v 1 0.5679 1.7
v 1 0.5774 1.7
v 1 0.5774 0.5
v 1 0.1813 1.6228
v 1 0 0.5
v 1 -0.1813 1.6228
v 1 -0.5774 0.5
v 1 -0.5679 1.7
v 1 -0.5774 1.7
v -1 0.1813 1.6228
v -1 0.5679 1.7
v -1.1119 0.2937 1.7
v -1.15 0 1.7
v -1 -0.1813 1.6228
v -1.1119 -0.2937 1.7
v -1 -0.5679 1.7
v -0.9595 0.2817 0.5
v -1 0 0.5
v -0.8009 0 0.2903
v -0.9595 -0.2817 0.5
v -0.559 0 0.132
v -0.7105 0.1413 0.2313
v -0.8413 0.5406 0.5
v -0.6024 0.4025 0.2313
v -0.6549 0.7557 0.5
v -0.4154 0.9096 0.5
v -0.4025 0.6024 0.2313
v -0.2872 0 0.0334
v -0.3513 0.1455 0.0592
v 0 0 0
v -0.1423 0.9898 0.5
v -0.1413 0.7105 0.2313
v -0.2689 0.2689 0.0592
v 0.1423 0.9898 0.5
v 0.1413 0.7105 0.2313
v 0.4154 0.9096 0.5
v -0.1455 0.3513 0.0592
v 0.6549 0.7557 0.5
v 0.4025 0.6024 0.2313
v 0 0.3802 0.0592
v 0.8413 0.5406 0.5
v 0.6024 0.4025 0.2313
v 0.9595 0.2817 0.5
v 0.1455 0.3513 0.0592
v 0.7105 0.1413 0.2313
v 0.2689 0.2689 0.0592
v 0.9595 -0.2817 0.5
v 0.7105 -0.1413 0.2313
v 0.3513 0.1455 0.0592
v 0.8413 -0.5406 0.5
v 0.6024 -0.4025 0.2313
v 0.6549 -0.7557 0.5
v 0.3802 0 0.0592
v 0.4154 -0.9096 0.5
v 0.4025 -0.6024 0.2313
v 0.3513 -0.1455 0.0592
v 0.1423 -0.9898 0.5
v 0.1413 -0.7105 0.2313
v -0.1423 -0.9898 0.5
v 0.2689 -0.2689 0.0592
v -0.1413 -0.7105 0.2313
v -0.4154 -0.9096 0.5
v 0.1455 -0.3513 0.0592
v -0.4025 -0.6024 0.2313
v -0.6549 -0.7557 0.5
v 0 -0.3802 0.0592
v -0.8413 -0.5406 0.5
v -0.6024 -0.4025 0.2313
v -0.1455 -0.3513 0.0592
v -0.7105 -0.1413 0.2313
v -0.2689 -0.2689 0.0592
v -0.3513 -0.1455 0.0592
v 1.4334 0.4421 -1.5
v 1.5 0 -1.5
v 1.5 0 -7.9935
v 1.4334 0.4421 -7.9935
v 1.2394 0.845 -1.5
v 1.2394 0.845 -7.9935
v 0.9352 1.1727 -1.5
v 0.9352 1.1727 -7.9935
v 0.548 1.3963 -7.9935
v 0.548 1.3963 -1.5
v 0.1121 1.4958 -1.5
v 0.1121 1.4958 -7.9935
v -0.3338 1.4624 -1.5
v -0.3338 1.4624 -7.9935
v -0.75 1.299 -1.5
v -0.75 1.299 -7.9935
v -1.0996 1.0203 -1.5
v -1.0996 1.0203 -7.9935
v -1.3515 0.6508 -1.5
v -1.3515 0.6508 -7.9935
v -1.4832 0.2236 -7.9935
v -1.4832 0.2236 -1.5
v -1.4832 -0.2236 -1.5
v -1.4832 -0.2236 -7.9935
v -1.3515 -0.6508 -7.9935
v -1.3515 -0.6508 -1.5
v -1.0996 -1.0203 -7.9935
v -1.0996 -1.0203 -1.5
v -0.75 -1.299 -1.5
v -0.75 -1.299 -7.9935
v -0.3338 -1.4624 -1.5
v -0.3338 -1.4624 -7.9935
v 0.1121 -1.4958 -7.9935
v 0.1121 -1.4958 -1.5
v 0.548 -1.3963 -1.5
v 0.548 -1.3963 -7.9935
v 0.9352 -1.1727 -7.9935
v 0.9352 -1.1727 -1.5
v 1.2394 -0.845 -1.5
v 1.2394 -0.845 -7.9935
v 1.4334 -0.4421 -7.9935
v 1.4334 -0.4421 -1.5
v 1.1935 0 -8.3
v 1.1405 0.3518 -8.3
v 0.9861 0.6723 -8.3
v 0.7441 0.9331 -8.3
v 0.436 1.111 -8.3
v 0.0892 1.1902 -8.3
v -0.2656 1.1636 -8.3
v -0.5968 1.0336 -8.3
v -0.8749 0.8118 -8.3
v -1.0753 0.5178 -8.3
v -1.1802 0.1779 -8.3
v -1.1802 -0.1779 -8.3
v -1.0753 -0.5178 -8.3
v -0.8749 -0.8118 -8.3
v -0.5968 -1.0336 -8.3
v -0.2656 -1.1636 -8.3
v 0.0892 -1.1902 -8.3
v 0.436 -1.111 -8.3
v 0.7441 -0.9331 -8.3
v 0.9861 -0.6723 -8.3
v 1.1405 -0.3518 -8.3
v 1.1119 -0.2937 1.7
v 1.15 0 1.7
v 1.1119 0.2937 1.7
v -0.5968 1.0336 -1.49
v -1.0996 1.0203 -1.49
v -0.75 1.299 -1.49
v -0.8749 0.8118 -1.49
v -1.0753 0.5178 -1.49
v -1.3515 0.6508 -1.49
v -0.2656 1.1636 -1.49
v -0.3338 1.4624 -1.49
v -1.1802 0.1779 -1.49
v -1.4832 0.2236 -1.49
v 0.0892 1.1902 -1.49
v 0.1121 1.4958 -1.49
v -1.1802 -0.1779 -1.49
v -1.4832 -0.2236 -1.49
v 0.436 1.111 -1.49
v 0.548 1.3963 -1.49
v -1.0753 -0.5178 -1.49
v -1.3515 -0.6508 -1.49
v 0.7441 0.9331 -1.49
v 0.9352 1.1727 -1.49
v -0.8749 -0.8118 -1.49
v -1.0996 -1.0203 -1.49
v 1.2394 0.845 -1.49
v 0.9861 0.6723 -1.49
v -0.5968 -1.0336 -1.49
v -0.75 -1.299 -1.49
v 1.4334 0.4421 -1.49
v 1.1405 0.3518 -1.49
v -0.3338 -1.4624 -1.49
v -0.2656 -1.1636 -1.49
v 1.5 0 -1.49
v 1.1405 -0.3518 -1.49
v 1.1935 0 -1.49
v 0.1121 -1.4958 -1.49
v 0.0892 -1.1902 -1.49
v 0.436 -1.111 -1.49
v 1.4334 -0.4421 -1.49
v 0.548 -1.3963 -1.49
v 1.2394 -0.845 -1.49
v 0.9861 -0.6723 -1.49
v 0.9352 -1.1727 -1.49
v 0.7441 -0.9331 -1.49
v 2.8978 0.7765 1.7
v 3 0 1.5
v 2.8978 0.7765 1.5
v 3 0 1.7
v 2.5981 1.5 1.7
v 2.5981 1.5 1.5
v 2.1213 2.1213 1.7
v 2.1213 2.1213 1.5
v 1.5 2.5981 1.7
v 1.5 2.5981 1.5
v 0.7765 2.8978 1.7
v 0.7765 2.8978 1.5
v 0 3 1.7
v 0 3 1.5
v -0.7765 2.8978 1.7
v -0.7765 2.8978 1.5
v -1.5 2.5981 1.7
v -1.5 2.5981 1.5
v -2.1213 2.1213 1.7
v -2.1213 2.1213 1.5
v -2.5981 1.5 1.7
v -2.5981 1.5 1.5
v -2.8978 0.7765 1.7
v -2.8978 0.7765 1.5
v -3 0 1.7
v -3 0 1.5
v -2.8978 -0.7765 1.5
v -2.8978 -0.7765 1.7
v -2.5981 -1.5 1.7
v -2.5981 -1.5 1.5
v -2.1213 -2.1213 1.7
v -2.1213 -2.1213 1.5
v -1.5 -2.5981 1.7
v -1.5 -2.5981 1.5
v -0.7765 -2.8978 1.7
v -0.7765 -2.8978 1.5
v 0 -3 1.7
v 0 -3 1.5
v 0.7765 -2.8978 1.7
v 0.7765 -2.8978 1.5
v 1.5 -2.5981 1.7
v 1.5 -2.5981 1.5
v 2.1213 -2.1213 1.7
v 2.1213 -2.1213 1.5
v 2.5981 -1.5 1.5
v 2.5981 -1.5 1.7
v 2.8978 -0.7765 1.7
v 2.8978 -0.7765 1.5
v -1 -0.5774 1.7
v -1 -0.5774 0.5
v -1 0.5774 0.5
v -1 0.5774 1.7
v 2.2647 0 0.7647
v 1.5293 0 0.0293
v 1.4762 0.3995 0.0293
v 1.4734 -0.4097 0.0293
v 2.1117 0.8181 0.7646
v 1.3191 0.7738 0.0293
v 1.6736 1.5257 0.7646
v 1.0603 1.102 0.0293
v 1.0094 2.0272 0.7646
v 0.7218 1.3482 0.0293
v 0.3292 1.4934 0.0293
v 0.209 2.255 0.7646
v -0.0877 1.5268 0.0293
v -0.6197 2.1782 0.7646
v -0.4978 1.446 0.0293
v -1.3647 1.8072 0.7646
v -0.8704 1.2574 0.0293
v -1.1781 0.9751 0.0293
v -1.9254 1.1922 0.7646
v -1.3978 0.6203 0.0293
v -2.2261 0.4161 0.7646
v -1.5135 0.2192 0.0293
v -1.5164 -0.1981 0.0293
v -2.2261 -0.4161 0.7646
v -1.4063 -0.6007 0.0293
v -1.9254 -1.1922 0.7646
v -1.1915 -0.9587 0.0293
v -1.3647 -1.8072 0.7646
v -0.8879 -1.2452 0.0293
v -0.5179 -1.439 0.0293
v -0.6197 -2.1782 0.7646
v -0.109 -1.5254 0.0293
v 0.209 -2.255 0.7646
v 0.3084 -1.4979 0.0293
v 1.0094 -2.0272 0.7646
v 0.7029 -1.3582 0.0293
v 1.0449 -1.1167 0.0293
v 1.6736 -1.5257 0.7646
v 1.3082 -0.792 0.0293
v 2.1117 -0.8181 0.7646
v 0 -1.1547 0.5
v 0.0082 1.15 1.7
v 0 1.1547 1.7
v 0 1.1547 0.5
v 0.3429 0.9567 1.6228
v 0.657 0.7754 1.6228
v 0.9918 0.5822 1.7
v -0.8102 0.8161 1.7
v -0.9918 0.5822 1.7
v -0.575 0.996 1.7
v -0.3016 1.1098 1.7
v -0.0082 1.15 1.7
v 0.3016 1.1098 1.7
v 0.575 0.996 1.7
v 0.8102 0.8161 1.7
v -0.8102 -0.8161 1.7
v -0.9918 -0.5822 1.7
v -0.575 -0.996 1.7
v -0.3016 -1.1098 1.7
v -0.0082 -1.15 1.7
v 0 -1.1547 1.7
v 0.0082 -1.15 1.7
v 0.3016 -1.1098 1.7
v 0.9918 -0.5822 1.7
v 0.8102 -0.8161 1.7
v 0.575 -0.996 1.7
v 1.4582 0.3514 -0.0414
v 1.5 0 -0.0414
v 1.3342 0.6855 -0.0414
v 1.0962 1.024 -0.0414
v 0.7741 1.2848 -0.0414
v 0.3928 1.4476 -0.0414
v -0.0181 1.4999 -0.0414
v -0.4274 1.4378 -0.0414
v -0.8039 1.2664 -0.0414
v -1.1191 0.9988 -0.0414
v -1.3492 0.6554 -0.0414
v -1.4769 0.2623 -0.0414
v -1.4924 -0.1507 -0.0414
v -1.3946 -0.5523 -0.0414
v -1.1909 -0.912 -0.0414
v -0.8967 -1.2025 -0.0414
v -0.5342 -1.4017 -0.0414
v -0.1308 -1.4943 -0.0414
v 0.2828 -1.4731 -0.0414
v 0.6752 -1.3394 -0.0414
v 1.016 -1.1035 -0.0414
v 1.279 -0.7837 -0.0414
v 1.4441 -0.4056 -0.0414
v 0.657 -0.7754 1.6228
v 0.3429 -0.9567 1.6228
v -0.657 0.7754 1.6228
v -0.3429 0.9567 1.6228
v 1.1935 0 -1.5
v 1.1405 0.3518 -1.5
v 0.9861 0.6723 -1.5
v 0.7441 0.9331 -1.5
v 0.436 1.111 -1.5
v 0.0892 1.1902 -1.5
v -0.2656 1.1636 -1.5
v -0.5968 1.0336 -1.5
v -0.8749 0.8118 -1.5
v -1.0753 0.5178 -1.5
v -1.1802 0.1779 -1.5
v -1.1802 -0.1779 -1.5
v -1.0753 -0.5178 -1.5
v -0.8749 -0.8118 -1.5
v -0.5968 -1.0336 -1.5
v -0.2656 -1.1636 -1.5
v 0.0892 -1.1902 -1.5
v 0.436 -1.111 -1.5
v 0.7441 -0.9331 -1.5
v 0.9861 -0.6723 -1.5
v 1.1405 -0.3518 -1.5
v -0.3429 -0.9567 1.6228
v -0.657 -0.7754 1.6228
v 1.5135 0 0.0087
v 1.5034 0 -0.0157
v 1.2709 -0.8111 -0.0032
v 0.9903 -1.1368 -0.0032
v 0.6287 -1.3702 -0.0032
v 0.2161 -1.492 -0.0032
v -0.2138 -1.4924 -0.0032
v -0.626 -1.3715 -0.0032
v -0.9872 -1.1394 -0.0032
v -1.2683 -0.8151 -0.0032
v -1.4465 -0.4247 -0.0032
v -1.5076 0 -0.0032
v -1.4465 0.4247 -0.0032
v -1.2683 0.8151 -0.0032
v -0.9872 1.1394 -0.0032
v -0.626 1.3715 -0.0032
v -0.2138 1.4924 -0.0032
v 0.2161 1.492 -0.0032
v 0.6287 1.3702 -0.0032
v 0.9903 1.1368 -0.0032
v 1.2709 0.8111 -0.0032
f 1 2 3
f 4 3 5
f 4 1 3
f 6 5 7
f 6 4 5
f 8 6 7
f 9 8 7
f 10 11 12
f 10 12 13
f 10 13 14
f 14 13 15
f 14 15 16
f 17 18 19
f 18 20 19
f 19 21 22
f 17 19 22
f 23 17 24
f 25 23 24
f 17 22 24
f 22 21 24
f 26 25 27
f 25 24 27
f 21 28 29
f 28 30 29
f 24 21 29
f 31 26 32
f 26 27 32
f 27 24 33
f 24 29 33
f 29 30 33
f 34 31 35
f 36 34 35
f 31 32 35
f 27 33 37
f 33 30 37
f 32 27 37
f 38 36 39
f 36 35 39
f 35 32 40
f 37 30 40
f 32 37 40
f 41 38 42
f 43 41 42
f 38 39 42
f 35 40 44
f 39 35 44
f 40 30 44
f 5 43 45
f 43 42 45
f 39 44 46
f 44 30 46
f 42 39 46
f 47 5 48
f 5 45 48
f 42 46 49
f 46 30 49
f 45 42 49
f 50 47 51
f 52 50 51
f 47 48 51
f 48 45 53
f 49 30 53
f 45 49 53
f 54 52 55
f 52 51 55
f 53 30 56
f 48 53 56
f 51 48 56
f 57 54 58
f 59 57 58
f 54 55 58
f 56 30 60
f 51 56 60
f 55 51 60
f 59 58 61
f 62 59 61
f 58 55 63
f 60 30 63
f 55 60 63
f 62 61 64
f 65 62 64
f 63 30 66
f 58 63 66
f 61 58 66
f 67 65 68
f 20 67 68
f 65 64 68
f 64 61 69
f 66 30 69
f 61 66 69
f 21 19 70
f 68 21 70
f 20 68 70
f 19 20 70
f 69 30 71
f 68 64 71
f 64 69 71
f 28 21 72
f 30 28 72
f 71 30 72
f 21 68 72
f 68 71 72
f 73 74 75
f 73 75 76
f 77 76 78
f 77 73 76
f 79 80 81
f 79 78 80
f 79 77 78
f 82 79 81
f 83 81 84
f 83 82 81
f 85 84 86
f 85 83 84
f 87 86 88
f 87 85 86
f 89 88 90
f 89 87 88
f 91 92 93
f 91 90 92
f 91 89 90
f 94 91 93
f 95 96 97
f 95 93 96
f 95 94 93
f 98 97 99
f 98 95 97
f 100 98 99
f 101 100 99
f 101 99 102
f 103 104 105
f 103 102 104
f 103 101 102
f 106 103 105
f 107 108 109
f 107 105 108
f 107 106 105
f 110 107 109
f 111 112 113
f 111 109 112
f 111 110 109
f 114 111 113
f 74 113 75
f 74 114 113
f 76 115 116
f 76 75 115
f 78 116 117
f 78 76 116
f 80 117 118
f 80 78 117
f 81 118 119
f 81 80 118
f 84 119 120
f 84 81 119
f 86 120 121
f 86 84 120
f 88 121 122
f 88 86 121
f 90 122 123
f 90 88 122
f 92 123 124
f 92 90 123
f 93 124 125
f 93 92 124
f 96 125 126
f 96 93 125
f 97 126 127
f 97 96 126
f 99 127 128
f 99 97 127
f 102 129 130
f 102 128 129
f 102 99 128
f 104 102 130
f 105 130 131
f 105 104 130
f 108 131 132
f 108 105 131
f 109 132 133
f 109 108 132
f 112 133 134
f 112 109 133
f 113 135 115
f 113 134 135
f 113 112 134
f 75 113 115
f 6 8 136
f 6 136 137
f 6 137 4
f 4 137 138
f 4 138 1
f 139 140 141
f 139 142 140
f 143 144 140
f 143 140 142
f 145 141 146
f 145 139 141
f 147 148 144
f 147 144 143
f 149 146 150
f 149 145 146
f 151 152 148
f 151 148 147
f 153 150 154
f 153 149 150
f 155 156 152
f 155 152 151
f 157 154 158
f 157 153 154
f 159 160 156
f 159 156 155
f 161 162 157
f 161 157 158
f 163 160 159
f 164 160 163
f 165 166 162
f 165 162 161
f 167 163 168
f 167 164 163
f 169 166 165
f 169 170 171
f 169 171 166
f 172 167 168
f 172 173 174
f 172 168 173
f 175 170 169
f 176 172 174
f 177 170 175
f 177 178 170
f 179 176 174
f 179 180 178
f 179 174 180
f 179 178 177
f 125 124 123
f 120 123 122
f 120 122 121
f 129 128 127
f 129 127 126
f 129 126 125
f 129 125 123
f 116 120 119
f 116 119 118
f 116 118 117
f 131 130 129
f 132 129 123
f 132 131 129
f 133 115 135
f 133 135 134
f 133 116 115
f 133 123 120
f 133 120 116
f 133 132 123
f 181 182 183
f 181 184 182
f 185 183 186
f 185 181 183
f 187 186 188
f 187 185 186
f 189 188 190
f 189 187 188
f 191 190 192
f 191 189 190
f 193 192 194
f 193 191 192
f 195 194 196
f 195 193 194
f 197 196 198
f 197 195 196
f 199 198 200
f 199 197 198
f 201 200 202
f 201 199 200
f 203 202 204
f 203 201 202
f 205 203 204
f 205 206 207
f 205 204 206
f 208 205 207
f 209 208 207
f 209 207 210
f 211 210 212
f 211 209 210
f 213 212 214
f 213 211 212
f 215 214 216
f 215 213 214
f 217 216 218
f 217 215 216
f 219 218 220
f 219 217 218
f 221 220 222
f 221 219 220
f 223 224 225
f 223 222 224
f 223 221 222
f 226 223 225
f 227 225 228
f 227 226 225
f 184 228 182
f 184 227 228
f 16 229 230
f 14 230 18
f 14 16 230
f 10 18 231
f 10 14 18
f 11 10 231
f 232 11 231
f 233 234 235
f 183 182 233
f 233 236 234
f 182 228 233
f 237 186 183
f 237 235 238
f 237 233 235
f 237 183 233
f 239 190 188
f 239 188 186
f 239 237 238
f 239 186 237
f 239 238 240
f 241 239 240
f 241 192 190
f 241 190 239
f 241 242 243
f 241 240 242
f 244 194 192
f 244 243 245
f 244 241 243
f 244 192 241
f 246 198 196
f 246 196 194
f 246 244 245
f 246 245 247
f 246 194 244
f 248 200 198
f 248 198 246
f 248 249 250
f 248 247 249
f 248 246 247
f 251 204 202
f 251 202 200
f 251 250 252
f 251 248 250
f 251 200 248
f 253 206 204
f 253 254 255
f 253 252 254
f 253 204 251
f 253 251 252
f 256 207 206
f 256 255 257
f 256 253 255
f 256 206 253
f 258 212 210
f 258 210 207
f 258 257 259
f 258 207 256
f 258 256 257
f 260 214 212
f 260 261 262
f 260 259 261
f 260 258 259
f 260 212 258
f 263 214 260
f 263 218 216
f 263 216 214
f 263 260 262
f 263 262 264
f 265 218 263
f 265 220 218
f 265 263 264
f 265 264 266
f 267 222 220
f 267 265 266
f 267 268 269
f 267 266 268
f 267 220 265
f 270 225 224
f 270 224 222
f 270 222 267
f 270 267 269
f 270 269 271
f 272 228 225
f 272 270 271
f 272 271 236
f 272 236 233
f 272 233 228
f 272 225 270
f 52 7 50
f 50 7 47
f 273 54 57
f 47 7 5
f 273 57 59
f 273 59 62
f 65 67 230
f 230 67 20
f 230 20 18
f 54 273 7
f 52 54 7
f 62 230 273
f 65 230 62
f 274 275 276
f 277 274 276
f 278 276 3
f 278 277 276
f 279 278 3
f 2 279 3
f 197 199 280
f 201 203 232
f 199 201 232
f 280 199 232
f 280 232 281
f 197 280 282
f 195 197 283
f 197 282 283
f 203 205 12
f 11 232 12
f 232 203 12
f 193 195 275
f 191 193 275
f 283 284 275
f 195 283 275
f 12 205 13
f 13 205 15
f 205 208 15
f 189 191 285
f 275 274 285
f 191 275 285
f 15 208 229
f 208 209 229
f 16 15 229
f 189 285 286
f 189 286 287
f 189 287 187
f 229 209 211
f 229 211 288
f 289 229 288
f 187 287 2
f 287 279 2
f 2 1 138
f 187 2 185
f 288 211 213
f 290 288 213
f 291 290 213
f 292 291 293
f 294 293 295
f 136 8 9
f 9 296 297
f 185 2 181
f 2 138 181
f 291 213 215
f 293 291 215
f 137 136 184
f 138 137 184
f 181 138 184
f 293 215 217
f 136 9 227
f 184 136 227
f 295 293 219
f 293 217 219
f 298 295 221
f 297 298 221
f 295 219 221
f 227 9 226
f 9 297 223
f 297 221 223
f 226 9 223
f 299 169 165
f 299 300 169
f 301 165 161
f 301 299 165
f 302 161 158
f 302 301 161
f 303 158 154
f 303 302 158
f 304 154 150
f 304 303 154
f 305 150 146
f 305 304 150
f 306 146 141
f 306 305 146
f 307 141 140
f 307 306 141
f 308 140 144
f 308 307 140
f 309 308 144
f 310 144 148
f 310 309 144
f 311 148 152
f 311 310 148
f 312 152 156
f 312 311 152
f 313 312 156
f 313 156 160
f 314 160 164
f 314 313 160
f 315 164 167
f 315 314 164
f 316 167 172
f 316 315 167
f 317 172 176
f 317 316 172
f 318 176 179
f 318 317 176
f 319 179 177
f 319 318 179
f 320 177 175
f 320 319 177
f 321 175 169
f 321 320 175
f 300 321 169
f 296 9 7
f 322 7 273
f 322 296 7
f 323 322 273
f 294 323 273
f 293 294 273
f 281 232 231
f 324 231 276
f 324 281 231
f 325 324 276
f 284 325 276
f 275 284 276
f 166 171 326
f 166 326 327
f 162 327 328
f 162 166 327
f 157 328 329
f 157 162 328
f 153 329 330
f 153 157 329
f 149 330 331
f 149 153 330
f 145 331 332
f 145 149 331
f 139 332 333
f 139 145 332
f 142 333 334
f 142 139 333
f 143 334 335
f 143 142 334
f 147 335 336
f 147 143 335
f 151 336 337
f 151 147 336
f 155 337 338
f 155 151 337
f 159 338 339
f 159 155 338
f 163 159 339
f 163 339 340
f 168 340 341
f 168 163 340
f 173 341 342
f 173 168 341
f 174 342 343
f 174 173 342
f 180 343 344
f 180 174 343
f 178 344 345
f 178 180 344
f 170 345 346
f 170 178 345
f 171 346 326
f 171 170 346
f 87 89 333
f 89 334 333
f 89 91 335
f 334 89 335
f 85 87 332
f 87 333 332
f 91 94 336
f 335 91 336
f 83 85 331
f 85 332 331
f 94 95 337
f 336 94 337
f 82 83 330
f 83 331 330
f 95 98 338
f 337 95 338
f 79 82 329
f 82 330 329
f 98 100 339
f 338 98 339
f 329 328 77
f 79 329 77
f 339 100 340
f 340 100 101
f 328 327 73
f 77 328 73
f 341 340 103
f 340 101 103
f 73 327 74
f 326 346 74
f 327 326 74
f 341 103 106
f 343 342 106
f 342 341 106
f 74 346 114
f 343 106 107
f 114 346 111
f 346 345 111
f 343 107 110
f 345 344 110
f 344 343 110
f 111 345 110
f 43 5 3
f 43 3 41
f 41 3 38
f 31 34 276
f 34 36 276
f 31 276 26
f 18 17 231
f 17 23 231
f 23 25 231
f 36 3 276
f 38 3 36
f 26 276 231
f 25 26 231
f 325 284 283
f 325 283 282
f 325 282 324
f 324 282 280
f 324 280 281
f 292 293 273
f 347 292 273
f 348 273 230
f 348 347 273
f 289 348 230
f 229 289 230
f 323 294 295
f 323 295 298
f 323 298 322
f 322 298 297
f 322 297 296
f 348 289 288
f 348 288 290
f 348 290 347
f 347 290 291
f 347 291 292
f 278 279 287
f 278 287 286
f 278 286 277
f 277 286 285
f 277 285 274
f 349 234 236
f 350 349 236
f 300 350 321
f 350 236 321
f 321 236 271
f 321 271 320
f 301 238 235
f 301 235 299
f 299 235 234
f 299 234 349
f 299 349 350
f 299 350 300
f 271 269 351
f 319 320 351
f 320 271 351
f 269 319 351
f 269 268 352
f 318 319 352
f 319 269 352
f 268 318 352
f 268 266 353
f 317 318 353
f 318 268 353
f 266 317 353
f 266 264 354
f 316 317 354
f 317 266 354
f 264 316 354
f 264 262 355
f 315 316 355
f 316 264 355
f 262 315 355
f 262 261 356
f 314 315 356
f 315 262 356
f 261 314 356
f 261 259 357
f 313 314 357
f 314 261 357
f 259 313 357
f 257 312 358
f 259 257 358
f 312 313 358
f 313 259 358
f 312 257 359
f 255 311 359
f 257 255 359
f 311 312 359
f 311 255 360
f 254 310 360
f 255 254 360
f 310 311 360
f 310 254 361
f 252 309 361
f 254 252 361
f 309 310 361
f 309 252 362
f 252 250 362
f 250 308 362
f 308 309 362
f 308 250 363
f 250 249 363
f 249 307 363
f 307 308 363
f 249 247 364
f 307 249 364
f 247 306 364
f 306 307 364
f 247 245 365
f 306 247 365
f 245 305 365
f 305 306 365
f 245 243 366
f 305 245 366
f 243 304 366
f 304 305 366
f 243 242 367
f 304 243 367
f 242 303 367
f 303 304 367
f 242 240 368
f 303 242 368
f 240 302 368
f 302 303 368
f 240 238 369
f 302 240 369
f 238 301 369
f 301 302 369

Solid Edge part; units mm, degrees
sketch "Sketch1" plane through (0, 0, 0) normal (0, -1, 0) x (1, 0, 0)
  line L0 (1.5, 0) -> (3, 1.5)
  line L1 (3, 1.5) -> (3, 1.7)
  line L2 (3, 1.7) -> (0, 1.7)
  line L3 (0, 1.7) -> (0, -8.3)
  line L4 (0, -8.3) -> (1.1935, -8.3)
  line L5 (1.1935, -8.3) -> (1.5, -7.9935)
  line L6 (1.5, -7.9935) -> (1.5, -1.5)
  line L7 (1.5, -1.5) -> (1.1935, -1.5)
  line L8 (1.1935, -1.5) -> (1.1935, -1.49)
  line L9 (1.1935, -1.49) -> (1.5, -1.49)
  line L10 (1.5, -1.49) -> (1.5, 0)
  dimension "D1" = 10
  dimension "D2" = 3
  dimension "D3" = 1.7
  dimension "D4" = 0.01
  dimension "D5" = 1.1935
  dimension "D6" = 3.2
  dimension "D7" = 0.2
revolve "RevolvedProtrusion1" add sketch "Sketch1" angle 360 about axis through (0, 0, 54) along (0, 0, -1)
sketch "Sketch2" plane through (0, 0, 0) normal (0, -1, 0) x (1, 0, 0)
  arc A0 (-1, 0.5) -> (0, 0) centre (0, 1.25) ccw
  line L0 (0, 0.5) -> (0, 0)
  line L1 (-1, 0.5) -> (0, 0.5)
  dimension "D1" = 8.8
revolve "RevolvedCutout1" cut sketch "Sketch2" angle 360 about axis through (0, 0, 54) along (0, 0, -1)
sketch "Sketch3" plane through (0, 0, 1.7) normal (0, 0, 1) x (0, -1, 0)
  line L0 (-1.1547, 0) -> (-0.5774, 1)
  line L1 (-0.5774, 1) -> (0.5774, 1)
  line L2 (0.5774, 1) -> (1.1547, 0)
  line L3 (1.1547, 0) -> (0.5774, -1)
  line L4 (0.5774, -1) -> (-0.5774, -1)
  line L5 (-0.5774, -1) -> (-1.1547, 0)
  dimension "D1" = 2
extrude "Cutout1" cut sketch "Sketch3" against normal blind 1.2
cosmetic_thread "Thread1" size "M3"
sketch "Sketch4" plane through (0, 0, 0) normal (1, 0, 0) x (0, 1, 0)
  line L0 (-1.15, 1.7) -> (0, 1.036)
revolve "RevolvedCutout2" cut sketch "Sketch4" angle 360 about axis through (0, 0, -57) along (0, 0, 1) material side at (0, -0.55, 1.4113)
fillet "Round1" radius 0.1 1 edges at (-1.5, 0, 0)
properties material "Stahl"
